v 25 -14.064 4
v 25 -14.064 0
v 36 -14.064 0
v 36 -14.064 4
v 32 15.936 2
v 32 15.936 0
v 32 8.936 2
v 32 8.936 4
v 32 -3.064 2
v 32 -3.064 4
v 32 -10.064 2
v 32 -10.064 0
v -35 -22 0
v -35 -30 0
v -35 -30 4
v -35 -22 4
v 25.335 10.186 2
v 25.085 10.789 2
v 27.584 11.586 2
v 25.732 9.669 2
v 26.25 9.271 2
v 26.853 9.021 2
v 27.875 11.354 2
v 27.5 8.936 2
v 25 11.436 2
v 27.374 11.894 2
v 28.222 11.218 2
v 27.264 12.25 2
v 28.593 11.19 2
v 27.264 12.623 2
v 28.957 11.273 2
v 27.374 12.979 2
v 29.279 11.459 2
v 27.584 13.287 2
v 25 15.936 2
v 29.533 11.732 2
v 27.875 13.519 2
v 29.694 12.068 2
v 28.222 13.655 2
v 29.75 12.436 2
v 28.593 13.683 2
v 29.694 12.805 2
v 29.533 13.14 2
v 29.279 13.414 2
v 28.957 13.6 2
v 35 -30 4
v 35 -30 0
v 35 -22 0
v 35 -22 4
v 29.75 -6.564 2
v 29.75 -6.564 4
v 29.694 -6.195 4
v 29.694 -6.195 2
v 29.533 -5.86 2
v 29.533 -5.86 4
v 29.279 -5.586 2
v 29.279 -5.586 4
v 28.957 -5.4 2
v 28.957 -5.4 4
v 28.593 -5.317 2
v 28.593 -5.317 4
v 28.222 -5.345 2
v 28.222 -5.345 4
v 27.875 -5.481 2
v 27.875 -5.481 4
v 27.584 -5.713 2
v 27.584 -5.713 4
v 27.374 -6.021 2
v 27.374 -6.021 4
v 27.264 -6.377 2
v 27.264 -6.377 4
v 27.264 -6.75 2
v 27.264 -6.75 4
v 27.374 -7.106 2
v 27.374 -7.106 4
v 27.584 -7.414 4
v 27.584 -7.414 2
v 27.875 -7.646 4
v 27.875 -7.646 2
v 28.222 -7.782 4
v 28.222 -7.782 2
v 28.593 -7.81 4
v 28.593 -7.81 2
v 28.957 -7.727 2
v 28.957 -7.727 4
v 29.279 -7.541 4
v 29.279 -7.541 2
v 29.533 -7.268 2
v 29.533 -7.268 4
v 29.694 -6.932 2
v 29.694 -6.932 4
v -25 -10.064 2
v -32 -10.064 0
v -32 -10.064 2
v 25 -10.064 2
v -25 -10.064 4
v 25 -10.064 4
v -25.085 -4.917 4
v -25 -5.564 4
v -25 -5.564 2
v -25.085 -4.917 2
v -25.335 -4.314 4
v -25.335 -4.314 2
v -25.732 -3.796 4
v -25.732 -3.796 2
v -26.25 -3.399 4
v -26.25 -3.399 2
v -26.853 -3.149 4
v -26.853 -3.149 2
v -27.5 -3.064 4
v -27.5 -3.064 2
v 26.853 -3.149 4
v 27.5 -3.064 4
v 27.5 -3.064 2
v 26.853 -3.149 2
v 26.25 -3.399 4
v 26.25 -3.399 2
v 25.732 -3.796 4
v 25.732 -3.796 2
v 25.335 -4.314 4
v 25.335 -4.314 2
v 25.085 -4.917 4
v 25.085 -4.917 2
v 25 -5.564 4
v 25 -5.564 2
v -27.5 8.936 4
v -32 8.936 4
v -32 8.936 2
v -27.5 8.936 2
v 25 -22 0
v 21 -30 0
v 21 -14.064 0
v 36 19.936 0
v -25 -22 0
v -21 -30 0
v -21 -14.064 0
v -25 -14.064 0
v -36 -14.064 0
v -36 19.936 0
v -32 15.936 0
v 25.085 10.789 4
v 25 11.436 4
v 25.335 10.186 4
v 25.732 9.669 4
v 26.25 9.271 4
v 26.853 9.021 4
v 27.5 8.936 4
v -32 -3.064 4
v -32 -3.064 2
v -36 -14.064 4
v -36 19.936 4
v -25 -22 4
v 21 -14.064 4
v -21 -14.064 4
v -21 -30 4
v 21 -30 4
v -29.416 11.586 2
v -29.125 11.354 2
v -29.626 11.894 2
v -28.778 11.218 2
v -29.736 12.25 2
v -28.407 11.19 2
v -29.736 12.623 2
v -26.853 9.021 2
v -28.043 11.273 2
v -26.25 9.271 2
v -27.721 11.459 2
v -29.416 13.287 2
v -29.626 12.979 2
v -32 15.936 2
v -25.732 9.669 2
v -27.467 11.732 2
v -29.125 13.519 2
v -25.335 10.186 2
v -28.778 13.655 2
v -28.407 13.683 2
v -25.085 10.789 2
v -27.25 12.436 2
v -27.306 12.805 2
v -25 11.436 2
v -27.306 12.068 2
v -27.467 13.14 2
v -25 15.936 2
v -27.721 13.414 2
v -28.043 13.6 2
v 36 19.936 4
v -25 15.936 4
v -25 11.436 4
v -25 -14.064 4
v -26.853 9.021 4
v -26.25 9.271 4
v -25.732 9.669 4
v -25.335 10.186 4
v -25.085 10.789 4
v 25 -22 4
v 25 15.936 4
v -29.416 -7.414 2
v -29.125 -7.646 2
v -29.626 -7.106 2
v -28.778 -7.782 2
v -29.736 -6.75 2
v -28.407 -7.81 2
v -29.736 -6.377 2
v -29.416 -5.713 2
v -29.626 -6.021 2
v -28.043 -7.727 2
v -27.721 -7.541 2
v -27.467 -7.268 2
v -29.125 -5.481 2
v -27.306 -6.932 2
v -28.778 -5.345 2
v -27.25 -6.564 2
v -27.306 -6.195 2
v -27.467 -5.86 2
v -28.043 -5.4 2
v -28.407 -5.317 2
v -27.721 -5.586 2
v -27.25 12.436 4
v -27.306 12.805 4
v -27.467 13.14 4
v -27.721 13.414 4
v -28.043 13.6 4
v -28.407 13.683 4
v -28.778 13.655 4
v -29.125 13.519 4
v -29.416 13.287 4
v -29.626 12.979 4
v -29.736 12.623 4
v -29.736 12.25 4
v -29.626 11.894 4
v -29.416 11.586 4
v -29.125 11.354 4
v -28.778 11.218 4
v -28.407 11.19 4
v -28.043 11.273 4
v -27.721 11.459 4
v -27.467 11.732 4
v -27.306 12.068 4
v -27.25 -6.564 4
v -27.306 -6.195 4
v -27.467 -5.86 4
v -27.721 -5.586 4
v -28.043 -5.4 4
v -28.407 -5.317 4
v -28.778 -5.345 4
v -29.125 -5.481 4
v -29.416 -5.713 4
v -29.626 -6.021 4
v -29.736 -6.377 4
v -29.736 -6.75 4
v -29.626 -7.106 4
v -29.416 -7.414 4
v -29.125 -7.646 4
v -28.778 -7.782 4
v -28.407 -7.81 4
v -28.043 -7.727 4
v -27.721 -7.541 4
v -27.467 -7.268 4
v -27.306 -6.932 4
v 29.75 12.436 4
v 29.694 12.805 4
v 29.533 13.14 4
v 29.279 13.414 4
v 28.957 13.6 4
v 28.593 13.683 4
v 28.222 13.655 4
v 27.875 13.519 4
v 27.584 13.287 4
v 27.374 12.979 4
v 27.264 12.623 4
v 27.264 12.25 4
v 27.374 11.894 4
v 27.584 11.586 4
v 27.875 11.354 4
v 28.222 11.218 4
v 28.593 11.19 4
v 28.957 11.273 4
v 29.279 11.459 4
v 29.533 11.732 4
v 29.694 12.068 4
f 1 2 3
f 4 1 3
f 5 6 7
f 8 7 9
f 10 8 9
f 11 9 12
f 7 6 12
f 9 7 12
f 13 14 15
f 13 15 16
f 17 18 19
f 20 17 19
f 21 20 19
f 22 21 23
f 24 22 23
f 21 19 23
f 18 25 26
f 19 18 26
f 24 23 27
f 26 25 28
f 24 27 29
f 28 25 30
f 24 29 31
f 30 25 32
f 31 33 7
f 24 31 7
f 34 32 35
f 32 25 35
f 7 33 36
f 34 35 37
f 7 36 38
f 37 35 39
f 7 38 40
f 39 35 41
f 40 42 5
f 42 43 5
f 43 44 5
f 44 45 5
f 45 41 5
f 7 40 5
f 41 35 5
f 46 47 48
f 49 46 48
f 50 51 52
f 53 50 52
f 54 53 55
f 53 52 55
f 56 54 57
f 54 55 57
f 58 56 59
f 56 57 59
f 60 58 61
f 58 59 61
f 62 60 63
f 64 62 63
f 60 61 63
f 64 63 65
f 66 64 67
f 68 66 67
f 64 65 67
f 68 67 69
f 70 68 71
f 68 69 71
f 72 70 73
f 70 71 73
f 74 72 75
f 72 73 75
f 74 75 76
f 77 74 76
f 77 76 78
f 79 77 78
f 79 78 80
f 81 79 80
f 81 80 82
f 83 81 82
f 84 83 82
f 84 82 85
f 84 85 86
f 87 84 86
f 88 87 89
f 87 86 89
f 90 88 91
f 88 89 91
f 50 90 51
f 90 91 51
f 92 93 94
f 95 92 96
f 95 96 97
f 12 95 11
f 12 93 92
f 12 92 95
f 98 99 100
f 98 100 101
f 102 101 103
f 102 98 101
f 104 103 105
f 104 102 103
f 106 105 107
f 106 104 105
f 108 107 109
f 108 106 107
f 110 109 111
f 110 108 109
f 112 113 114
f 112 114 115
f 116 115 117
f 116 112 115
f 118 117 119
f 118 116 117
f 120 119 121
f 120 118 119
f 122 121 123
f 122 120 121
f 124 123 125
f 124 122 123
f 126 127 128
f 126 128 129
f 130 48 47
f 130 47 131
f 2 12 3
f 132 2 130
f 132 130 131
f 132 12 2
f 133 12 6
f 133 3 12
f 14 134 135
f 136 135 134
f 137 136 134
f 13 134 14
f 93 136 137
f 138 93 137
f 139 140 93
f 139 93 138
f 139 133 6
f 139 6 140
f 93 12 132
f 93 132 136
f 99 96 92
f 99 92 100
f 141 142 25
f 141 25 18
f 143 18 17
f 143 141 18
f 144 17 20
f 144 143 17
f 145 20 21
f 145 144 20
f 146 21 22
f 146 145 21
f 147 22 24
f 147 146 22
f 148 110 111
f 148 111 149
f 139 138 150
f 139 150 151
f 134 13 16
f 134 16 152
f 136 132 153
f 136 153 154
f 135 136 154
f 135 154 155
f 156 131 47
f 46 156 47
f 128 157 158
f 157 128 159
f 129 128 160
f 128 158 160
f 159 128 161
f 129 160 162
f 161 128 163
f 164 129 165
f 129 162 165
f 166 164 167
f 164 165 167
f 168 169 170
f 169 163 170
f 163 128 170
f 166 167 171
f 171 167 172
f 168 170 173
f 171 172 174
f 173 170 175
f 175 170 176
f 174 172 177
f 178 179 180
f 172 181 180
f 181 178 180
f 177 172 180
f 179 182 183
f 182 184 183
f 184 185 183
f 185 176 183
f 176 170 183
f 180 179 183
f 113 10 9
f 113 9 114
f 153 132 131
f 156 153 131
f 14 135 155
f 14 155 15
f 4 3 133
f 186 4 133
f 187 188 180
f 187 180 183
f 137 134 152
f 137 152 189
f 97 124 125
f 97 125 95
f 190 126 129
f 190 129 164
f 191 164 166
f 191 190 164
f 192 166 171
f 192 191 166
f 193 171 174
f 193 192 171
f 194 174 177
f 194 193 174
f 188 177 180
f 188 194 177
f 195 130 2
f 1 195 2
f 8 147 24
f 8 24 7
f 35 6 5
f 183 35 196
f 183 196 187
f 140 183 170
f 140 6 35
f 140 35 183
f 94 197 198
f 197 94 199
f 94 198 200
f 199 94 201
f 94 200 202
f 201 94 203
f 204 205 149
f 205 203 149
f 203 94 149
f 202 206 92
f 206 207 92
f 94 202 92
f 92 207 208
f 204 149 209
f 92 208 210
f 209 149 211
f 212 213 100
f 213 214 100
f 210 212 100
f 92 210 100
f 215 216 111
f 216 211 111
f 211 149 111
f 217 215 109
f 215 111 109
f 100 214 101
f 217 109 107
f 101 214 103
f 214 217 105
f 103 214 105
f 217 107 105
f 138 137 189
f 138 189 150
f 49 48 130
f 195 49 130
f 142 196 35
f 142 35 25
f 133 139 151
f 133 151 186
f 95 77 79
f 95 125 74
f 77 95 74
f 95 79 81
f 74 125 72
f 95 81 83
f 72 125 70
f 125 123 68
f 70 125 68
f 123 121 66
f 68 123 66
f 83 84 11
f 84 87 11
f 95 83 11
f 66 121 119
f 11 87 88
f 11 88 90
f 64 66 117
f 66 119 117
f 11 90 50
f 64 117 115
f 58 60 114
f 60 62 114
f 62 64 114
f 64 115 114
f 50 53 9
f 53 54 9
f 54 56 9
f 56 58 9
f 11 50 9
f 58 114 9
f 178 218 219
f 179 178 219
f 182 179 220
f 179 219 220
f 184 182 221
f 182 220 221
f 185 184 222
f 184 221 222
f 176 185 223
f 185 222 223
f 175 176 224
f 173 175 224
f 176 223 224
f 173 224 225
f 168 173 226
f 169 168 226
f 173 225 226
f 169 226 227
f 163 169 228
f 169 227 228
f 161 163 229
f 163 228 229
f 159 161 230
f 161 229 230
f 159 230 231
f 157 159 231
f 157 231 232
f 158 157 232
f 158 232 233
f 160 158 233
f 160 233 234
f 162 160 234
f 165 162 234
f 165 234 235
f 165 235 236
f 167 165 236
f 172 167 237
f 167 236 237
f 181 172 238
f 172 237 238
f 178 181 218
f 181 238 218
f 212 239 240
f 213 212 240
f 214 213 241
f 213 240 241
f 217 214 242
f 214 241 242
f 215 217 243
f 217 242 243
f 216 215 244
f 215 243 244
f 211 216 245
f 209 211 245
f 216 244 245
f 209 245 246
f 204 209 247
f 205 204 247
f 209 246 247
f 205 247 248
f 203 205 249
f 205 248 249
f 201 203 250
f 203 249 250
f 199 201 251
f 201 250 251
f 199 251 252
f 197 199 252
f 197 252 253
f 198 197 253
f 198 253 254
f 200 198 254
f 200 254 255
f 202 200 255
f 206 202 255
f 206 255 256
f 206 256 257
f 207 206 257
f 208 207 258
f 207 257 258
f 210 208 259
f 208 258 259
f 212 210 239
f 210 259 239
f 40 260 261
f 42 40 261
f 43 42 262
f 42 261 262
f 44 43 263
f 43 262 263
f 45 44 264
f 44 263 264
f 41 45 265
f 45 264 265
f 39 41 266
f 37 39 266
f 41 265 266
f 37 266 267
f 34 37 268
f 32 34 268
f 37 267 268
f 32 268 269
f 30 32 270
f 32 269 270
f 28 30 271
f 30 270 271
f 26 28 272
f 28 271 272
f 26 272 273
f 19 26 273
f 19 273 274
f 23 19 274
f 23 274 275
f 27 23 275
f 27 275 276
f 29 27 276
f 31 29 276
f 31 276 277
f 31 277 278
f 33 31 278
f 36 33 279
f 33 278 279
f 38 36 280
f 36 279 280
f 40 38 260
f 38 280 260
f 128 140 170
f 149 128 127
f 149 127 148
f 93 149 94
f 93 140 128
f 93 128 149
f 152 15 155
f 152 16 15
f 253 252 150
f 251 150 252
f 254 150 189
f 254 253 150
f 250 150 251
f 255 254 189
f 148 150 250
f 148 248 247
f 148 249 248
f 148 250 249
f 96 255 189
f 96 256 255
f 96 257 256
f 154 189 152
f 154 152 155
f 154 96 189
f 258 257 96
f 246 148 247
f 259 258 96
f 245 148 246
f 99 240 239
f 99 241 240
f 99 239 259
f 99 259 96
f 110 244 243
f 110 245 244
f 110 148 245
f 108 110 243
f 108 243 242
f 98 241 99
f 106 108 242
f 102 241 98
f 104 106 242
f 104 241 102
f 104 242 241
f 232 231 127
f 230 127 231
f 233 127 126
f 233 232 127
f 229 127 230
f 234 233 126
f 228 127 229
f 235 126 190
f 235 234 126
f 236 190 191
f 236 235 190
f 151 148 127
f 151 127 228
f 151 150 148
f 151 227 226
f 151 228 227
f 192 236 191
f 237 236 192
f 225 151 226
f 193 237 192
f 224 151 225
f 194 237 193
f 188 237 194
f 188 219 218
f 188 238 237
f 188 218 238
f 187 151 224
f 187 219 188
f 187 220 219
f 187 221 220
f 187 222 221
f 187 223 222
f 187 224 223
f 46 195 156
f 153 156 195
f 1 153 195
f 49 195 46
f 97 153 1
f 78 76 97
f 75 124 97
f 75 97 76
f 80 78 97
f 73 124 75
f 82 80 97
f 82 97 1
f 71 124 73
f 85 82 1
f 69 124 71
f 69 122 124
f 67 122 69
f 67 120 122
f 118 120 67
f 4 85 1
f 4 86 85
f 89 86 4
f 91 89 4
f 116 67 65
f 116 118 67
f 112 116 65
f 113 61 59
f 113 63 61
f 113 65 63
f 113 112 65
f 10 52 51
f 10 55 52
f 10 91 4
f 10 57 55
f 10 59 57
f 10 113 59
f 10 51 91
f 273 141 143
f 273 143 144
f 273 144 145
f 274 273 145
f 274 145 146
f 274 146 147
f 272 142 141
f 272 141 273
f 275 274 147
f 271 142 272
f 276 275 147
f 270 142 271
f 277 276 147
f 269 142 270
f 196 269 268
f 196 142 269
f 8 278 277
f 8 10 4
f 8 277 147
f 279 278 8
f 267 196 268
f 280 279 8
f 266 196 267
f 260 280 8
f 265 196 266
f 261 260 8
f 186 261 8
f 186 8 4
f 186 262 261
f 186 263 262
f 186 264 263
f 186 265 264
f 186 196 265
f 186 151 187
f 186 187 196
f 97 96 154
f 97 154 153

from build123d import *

# Parameters (mm, degrees)
F1_DEPTH = 4
F3_R     = 1.25
F4_DEPTH = 2


with BuildPart() as f1:
    # F0 (on Top) → F1 (new body)
    with BuildSketch(Plane.XY):
        Polygon((21, -30), (25, -30), (35, -30), (35, -22), (25, -22), (25, -14.063702), (36, -14.063702), (36, 19.936298), (0, 19.936298), (0, 15.936298), (32, 15.936298), (32, -10.063702), (0, -10.063702), (0, -14.063702), (21, -14.063702), align=None)
    extrude(amount=F1_DEPTH)

    # F2: F1 across plane


with BuildPart() as f1_1:
    add(f1.part)
    add(f1.part.mirror(Plane.YZ))

    # F3 (on face) → F4 (join)
    with BuildSketch(Plane.XY.offset(4)):
        with BuildLine():
            Line((-32, -3.063702), (-32, -10.063702))
            Line((-32, -10.063702), (-25, -10.063702))
            Line((-25, -10.063702), (-25, -5.563702))
            ThreePointArc((-25, -5.563702), (-25.732233, -3.795935), (-27.5, -3.063702))
            Line((-27.5, -3.063702), (-32, -3.063702))
        make_face()
        with Locations((-28.5, -6.563702)):
            Circle(F3_R, mode=Mode.SUBTRACT)
        with BuildLine():
            Line((-25, 15.936298), (-32, 15.936298))
            Line((-32, 15.936298), (-32, 8.936298))
            Line((-32, 8.936298), (-27.5, 8.936298))
            ThreePointArc((-27.5, 8.936298), (-25.732233, 9.668531), (-25, 11.436298))
            Line((-25, 11.436298), (-25, 15.936298))
        make_face()
        with Locations((-28.5, 12.436298)):
            Circle(F3_R, mode=Mode.SUBTRACT)
        with BuildLine():
            Line((32, 8.936298), (32, 15.936298))
            Line((32, 15.936298), (25, 15.936298))
            Line((25, 15.936298), (25, 11.436298))
            ThreePointArc((25, 11.436298), (25.732233, 9.668531), (27.5, 8.936298))
            Line((27.5, 8.936298), (32, 8.936298))
        make_face()
        with Locations((28.5, 12.436298)):
            Circle(F3_R, mode=Mode.SUBTRACT)
        with BuildLine():
            Line((25, -10.063702), (32, -10.063702))
            Line((32, -10.063702), (32, -3.063702))
            Line((32, -3.063702), (27.5, -3.063702))
            ThreePointArc((27.5, -3.063702), (25.732233, -3.795935), (25, -5.563702))
            Line((25, -5.563702), (25, -10.063702))
        make_face()
        with Locations((28.5, -6.563702)):
            Circle(F3_R, mode=Mode.SUBTRACT)
    extrude(amount=-F4_DEPTH)


solid = f1_1.part
